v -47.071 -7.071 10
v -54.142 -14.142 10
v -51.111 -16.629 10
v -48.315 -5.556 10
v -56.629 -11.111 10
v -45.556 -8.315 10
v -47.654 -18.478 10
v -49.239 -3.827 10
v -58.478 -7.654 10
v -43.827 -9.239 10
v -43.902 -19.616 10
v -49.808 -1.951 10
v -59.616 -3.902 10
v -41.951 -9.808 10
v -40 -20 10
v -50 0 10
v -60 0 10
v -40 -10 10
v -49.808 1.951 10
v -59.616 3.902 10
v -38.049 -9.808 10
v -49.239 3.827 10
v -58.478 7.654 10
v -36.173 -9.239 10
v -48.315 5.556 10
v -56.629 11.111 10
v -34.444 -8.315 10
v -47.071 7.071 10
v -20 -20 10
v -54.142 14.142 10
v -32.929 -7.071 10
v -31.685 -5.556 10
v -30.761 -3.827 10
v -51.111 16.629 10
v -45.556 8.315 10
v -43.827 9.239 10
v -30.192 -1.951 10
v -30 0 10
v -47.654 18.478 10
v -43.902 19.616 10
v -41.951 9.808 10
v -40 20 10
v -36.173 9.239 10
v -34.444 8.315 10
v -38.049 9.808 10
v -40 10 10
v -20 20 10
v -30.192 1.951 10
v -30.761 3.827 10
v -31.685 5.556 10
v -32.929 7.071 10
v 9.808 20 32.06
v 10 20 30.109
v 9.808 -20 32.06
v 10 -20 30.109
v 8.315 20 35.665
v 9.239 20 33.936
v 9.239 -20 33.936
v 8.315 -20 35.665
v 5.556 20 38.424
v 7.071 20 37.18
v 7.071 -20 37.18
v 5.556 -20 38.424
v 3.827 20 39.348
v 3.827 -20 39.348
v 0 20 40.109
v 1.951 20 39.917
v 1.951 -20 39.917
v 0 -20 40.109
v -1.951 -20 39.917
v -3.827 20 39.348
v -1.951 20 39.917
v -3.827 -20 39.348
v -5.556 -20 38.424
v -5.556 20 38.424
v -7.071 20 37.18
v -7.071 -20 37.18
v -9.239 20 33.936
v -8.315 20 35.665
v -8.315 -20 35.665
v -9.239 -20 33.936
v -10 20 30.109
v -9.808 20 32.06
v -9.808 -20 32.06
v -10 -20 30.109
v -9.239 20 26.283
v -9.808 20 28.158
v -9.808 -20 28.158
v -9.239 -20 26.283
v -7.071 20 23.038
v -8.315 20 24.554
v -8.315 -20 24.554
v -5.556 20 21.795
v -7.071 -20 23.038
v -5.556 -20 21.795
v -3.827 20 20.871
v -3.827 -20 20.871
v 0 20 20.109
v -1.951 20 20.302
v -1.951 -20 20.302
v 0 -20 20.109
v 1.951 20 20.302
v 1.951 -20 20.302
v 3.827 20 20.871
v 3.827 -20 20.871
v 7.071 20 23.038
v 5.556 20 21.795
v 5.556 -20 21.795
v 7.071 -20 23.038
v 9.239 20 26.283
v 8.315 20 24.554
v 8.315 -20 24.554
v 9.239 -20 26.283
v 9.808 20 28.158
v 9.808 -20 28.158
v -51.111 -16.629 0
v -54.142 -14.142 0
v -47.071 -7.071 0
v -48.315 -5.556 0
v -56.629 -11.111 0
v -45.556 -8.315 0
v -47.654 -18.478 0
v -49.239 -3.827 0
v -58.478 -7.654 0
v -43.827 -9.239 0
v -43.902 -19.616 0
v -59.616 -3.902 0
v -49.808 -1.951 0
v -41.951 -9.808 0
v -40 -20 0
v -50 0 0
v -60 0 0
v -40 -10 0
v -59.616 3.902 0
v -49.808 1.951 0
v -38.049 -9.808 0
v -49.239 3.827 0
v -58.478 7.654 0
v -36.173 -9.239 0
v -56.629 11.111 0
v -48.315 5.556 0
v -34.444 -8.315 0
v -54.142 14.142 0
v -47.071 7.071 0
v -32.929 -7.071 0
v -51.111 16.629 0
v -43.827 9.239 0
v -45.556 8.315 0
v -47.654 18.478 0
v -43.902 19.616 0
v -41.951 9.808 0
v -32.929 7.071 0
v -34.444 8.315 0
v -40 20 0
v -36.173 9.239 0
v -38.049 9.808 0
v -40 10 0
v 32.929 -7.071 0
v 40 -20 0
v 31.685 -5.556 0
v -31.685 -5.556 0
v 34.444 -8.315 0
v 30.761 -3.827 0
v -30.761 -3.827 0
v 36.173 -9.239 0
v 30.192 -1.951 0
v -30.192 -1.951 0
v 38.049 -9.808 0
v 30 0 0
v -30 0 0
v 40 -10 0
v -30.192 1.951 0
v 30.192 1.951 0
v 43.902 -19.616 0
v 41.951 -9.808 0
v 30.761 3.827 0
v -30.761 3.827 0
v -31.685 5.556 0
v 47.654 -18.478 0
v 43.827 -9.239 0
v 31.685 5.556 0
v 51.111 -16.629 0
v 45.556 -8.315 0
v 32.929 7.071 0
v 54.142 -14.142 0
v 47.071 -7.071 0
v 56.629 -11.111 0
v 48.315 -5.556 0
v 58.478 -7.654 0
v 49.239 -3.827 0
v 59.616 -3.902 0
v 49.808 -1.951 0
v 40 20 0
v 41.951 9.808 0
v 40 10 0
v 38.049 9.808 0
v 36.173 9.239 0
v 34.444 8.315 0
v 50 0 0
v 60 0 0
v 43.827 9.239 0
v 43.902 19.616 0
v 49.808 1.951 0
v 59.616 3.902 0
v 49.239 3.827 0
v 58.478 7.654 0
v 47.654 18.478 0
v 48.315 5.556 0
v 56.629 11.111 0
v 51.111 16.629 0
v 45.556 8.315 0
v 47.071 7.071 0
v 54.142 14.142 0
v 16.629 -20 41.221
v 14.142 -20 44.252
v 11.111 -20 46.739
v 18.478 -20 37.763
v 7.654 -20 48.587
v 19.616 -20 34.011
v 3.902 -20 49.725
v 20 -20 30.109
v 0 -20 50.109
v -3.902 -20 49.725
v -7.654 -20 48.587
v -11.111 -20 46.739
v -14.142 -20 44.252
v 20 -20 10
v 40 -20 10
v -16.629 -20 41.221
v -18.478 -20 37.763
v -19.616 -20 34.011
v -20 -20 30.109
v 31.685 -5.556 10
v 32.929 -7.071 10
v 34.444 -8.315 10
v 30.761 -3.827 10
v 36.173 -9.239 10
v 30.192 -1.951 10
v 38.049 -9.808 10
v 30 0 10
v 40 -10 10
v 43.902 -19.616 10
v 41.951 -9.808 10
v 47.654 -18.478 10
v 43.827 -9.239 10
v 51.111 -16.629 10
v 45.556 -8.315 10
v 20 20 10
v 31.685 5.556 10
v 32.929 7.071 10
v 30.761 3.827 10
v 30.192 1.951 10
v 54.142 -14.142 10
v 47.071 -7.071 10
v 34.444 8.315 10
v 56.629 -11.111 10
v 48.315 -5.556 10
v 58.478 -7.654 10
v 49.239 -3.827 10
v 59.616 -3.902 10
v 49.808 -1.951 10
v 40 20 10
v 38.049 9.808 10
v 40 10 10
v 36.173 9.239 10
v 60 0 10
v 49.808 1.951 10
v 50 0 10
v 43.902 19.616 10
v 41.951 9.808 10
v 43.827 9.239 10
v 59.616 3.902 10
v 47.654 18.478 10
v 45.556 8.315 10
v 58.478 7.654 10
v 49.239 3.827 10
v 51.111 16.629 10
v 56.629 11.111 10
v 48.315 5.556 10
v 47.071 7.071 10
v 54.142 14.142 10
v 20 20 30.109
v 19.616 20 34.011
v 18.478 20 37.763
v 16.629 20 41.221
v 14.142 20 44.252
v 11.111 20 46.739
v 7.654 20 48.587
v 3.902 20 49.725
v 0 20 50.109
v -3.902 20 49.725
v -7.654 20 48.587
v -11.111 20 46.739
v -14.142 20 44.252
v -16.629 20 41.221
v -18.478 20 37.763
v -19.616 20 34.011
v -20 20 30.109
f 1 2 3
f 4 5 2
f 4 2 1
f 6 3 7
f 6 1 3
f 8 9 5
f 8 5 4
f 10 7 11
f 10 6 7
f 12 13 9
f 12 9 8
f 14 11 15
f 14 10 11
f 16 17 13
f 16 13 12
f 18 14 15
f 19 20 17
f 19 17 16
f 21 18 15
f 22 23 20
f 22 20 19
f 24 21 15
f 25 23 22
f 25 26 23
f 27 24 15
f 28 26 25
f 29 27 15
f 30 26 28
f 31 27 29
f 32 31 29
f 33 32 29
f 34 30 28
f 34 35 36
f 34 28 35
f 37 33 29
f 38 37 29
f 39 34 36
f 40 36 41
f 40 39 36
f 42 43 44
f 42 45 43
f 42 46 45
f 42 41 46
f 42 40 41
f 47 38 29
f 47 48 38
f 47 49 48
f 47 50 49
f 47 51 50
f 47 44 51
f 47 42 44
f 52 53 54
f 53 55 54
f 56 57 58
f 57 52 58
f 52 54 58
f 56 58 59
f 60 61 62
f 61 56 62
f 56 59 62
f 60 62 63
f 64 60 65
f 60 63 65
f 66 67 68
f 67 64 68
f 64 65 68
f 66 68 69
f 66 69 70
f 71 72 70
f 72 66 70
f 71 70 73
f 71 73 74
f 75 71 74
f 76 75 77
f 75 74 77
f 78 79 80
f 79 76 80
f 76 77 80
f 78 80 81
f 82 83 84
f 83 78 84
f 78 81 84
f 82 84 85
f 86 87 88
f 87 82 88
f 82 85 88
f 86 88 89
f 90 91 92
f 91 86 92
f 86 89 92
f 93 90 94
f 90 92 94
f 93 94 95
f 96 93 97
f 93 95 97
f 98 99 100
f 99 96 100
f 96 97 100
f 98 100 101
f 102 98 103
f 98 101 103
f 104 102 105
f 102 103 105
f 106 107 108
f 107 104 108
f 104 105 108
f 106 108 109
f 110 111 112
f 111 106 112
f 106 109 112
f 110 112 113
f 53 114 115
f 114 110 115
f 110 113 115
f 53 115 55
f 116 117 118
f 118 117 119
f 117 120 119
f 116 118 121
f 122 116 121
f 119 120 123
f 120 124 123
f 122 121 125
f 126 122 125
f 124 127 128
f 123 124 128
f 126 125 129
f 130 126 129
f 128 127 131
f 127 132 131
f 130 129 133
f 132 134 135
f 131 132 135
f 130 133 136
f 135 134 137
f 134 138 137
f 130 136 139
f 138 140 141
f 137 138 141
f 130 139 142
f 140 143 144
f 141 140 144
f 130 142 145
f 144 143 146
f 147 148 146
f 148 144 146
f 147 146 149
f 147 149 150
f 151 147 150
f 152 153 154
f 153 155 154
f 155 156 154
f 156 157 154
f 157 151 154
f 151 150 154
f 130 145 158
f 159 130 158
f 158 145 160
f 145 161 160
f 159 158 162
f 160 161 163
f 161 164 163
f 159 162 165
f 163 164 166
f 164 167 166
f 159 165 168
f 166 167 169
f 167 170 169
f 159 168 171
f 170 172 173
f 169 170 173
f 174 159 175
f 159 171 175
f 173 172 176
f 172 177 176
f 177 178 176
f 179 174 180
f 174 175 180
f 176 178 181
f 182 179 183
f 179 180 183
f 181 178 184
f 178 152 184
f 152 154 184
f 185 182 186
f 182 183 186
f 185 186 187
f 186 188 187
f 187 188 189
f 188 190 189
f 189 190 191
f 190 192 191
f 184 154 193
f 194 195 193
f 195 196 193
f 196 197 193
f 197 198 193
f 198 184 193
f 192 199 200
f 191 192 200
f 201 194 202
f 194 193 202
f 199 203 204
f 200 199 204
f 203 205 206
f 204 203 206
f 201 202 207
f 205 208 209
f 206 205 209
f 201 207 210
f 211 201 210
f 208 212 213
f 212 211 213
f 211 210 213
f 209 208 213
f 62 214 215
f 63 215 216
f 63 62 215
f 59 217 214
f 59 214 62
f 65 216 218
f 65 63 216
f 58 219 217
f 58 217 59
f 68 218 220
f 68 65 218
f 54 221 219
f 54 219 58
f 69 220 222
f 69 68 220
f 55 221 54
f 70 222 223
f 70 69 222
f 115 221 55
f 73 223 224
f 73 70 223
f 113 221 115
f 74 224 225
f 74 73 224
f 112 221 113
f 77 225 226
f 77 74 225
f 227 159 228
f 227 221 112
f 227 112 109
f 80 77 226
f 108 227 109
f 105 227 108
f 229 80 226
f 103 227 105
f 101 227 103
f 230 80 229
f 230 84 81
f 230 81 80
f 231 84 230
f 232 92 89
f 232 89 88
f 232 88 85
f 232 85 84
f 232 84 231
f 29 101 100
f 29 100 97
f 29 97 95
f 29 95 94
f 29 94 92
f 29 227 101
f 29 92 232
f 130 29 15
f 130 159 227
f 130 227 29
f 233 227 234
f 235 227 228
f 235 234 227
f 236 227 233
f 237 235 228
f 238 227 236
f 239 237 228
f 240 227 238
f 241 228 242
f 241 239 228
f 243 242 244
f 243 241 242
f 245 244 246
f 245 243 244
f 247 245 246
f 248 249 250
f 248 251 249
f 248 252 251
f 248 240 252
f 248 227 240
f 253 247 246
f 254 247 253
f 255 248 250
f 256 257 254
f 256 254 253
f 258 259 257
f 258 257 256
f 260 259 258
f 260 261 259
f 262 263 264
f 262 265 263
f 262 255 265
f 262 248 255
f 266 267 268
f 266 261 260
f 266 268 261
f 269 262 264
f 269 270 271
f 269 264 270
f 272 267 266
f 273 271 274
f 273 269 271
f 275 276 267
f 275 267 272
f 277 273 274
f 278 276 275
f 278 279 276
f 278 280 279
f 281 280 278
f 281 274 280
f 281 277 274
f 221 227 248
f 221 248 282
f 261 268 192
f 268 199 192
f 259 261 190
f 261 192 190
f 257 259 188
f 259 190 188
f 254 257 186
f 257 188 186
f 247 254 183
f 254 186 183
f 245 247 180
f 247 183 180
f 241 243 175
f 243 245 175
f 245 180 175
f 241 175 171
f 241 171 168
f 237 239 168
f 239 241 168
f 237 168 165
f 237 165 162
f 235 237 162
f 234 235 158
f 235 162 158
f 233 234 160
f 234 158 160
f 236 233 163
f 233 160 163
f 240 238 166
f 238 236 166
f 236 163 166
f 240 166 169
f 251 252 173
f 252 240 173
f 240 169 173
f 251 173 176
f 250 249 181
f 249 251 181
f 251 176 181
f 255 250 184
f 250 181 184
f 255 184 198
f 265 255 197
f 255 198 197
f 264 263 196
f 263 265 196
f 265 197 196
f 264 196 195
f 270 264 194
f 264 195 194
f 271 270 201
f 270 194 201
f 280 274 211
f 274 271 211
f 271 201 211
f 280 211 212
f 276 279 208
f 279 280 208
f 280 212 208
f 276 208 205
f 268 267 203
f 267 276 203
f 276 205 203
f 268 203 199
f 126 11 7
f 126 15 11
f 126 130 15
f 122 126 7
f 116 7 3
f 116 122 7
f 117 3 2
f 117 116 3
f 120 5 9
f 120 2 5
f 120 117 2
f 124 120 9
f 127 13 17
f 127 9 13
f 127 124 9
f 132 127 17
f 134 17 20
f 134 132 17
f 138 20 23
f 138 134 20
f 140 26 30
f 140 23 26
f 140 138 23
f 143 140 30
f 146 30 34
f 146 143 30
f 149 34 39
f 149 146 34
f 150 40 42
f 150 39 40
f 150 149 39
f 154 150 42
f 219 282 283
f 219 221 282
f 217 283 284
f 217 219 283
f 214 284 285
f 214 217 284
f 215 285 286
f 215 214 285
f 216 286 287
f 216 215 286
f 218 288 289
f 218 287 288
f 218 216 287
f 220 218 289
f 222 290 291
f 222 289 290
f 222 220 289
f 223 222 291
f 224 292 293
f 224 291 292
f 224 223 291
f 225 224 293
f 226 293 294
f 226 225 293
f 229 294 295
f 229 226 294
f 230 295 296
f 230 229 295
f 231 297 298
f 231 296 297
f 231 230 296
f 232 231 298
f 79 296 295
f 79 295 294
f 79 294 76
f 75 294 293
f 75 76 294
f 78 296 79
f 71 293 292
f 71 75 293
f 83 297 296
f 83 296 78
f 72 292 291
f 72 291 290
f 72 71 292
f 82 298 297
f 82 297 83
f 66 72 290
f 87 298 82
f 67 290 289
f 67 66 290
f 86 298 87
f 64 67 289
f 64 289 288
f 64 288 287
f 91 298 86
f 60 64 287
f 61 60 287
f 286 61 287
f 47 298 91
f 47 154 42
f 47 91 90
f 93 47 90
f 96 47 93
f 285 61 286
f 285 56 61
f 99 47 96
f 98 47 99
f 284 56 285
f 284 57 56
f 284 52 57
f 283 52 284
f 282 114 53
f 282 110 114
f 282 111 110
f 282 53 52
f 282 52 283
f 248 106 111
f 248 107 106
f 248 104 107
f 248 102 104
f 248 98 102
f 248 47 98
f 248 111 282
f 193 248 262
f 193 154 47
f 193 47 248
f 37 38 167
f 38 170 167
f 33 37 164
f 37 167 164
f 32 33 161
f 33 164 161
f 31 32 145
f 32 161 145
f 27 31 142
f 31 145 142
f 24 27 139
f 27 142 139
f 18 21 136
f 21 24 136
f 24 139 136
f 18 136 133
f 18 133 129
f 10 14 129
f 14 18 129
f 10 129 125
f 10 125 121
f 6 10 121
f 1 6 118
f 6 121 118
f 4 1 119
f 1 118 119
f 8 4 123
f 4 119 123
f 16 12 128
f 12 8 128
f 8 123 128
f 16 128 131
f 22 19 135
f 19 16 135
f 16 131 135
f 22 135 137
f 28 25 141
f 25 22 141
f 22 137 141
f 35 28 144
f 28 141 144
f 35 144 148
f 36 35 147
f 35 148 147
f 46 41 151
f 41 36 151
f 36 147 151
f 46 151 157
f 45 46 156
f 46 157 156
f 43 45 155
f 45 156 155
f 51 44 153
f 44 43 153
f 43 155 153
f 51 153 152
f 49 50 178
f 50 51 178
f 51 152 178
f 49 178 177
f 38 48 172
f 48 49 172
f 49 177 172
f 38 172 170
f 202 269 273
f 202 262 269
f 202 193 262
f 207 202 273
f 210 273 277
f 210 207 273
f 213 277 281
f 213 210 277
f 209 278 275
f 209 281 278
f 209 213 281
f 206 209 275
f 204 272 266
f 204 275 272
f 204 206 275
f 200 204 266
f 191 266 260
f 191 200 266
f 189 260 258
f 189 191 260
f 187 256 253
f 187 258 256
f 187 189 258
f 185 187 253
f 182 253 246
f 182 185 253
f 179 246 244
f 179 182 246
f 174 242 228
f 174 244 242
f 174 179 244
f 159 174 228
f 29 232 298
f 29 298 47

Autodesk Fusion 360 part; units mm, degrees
sketch "Sketch1" plane through (0, 0, 0) normal (0, 0, 1) x (1, 0, 0)
  line L0 (40, -20) -> (-40, -20)
  line L1 (-40, 20) -> (40, 20)
  circle A0 centre (40, 0) radius 10
  circle A1 centre (-40, 0) radius 10
  arc A2 (40, -20) -> (40, 20) centre (40, 0) ccw
  arc A3 (-40, 20) -> (-40, -20) centre (-40, 0) ccw
  dimension "d1" = 80
  dimension "d2" = 40
extrude "Extrude1" add sketch "Sketch1" along normal blind 10
sketch "Sketch2" plane through (0, 0, 0) normal (0, 1, 0) x (1, 0, 0)
  line L0 (-20, -0.1094) -> (20, -0.1094)
  line L1 (20, -0.1094) -> (20, -30.1094)
  line L2 (-20, -30.1094) -> (-20, -0.1094)
  line L3 (-40, 0) -> (-40, -10)
  circle A0 centre (0, -30.1094) radius 20
  circle A1 centre (0, -30.1094) radius 10
  dimension "d9" = 40
  dimension "d10" = 30
  dimension "d11" = 20
  dimension "d12" = 40
  dimension "d13" = 20
extrude "Extrude2" add sketch "Sketch2" along normal mid plane 40
